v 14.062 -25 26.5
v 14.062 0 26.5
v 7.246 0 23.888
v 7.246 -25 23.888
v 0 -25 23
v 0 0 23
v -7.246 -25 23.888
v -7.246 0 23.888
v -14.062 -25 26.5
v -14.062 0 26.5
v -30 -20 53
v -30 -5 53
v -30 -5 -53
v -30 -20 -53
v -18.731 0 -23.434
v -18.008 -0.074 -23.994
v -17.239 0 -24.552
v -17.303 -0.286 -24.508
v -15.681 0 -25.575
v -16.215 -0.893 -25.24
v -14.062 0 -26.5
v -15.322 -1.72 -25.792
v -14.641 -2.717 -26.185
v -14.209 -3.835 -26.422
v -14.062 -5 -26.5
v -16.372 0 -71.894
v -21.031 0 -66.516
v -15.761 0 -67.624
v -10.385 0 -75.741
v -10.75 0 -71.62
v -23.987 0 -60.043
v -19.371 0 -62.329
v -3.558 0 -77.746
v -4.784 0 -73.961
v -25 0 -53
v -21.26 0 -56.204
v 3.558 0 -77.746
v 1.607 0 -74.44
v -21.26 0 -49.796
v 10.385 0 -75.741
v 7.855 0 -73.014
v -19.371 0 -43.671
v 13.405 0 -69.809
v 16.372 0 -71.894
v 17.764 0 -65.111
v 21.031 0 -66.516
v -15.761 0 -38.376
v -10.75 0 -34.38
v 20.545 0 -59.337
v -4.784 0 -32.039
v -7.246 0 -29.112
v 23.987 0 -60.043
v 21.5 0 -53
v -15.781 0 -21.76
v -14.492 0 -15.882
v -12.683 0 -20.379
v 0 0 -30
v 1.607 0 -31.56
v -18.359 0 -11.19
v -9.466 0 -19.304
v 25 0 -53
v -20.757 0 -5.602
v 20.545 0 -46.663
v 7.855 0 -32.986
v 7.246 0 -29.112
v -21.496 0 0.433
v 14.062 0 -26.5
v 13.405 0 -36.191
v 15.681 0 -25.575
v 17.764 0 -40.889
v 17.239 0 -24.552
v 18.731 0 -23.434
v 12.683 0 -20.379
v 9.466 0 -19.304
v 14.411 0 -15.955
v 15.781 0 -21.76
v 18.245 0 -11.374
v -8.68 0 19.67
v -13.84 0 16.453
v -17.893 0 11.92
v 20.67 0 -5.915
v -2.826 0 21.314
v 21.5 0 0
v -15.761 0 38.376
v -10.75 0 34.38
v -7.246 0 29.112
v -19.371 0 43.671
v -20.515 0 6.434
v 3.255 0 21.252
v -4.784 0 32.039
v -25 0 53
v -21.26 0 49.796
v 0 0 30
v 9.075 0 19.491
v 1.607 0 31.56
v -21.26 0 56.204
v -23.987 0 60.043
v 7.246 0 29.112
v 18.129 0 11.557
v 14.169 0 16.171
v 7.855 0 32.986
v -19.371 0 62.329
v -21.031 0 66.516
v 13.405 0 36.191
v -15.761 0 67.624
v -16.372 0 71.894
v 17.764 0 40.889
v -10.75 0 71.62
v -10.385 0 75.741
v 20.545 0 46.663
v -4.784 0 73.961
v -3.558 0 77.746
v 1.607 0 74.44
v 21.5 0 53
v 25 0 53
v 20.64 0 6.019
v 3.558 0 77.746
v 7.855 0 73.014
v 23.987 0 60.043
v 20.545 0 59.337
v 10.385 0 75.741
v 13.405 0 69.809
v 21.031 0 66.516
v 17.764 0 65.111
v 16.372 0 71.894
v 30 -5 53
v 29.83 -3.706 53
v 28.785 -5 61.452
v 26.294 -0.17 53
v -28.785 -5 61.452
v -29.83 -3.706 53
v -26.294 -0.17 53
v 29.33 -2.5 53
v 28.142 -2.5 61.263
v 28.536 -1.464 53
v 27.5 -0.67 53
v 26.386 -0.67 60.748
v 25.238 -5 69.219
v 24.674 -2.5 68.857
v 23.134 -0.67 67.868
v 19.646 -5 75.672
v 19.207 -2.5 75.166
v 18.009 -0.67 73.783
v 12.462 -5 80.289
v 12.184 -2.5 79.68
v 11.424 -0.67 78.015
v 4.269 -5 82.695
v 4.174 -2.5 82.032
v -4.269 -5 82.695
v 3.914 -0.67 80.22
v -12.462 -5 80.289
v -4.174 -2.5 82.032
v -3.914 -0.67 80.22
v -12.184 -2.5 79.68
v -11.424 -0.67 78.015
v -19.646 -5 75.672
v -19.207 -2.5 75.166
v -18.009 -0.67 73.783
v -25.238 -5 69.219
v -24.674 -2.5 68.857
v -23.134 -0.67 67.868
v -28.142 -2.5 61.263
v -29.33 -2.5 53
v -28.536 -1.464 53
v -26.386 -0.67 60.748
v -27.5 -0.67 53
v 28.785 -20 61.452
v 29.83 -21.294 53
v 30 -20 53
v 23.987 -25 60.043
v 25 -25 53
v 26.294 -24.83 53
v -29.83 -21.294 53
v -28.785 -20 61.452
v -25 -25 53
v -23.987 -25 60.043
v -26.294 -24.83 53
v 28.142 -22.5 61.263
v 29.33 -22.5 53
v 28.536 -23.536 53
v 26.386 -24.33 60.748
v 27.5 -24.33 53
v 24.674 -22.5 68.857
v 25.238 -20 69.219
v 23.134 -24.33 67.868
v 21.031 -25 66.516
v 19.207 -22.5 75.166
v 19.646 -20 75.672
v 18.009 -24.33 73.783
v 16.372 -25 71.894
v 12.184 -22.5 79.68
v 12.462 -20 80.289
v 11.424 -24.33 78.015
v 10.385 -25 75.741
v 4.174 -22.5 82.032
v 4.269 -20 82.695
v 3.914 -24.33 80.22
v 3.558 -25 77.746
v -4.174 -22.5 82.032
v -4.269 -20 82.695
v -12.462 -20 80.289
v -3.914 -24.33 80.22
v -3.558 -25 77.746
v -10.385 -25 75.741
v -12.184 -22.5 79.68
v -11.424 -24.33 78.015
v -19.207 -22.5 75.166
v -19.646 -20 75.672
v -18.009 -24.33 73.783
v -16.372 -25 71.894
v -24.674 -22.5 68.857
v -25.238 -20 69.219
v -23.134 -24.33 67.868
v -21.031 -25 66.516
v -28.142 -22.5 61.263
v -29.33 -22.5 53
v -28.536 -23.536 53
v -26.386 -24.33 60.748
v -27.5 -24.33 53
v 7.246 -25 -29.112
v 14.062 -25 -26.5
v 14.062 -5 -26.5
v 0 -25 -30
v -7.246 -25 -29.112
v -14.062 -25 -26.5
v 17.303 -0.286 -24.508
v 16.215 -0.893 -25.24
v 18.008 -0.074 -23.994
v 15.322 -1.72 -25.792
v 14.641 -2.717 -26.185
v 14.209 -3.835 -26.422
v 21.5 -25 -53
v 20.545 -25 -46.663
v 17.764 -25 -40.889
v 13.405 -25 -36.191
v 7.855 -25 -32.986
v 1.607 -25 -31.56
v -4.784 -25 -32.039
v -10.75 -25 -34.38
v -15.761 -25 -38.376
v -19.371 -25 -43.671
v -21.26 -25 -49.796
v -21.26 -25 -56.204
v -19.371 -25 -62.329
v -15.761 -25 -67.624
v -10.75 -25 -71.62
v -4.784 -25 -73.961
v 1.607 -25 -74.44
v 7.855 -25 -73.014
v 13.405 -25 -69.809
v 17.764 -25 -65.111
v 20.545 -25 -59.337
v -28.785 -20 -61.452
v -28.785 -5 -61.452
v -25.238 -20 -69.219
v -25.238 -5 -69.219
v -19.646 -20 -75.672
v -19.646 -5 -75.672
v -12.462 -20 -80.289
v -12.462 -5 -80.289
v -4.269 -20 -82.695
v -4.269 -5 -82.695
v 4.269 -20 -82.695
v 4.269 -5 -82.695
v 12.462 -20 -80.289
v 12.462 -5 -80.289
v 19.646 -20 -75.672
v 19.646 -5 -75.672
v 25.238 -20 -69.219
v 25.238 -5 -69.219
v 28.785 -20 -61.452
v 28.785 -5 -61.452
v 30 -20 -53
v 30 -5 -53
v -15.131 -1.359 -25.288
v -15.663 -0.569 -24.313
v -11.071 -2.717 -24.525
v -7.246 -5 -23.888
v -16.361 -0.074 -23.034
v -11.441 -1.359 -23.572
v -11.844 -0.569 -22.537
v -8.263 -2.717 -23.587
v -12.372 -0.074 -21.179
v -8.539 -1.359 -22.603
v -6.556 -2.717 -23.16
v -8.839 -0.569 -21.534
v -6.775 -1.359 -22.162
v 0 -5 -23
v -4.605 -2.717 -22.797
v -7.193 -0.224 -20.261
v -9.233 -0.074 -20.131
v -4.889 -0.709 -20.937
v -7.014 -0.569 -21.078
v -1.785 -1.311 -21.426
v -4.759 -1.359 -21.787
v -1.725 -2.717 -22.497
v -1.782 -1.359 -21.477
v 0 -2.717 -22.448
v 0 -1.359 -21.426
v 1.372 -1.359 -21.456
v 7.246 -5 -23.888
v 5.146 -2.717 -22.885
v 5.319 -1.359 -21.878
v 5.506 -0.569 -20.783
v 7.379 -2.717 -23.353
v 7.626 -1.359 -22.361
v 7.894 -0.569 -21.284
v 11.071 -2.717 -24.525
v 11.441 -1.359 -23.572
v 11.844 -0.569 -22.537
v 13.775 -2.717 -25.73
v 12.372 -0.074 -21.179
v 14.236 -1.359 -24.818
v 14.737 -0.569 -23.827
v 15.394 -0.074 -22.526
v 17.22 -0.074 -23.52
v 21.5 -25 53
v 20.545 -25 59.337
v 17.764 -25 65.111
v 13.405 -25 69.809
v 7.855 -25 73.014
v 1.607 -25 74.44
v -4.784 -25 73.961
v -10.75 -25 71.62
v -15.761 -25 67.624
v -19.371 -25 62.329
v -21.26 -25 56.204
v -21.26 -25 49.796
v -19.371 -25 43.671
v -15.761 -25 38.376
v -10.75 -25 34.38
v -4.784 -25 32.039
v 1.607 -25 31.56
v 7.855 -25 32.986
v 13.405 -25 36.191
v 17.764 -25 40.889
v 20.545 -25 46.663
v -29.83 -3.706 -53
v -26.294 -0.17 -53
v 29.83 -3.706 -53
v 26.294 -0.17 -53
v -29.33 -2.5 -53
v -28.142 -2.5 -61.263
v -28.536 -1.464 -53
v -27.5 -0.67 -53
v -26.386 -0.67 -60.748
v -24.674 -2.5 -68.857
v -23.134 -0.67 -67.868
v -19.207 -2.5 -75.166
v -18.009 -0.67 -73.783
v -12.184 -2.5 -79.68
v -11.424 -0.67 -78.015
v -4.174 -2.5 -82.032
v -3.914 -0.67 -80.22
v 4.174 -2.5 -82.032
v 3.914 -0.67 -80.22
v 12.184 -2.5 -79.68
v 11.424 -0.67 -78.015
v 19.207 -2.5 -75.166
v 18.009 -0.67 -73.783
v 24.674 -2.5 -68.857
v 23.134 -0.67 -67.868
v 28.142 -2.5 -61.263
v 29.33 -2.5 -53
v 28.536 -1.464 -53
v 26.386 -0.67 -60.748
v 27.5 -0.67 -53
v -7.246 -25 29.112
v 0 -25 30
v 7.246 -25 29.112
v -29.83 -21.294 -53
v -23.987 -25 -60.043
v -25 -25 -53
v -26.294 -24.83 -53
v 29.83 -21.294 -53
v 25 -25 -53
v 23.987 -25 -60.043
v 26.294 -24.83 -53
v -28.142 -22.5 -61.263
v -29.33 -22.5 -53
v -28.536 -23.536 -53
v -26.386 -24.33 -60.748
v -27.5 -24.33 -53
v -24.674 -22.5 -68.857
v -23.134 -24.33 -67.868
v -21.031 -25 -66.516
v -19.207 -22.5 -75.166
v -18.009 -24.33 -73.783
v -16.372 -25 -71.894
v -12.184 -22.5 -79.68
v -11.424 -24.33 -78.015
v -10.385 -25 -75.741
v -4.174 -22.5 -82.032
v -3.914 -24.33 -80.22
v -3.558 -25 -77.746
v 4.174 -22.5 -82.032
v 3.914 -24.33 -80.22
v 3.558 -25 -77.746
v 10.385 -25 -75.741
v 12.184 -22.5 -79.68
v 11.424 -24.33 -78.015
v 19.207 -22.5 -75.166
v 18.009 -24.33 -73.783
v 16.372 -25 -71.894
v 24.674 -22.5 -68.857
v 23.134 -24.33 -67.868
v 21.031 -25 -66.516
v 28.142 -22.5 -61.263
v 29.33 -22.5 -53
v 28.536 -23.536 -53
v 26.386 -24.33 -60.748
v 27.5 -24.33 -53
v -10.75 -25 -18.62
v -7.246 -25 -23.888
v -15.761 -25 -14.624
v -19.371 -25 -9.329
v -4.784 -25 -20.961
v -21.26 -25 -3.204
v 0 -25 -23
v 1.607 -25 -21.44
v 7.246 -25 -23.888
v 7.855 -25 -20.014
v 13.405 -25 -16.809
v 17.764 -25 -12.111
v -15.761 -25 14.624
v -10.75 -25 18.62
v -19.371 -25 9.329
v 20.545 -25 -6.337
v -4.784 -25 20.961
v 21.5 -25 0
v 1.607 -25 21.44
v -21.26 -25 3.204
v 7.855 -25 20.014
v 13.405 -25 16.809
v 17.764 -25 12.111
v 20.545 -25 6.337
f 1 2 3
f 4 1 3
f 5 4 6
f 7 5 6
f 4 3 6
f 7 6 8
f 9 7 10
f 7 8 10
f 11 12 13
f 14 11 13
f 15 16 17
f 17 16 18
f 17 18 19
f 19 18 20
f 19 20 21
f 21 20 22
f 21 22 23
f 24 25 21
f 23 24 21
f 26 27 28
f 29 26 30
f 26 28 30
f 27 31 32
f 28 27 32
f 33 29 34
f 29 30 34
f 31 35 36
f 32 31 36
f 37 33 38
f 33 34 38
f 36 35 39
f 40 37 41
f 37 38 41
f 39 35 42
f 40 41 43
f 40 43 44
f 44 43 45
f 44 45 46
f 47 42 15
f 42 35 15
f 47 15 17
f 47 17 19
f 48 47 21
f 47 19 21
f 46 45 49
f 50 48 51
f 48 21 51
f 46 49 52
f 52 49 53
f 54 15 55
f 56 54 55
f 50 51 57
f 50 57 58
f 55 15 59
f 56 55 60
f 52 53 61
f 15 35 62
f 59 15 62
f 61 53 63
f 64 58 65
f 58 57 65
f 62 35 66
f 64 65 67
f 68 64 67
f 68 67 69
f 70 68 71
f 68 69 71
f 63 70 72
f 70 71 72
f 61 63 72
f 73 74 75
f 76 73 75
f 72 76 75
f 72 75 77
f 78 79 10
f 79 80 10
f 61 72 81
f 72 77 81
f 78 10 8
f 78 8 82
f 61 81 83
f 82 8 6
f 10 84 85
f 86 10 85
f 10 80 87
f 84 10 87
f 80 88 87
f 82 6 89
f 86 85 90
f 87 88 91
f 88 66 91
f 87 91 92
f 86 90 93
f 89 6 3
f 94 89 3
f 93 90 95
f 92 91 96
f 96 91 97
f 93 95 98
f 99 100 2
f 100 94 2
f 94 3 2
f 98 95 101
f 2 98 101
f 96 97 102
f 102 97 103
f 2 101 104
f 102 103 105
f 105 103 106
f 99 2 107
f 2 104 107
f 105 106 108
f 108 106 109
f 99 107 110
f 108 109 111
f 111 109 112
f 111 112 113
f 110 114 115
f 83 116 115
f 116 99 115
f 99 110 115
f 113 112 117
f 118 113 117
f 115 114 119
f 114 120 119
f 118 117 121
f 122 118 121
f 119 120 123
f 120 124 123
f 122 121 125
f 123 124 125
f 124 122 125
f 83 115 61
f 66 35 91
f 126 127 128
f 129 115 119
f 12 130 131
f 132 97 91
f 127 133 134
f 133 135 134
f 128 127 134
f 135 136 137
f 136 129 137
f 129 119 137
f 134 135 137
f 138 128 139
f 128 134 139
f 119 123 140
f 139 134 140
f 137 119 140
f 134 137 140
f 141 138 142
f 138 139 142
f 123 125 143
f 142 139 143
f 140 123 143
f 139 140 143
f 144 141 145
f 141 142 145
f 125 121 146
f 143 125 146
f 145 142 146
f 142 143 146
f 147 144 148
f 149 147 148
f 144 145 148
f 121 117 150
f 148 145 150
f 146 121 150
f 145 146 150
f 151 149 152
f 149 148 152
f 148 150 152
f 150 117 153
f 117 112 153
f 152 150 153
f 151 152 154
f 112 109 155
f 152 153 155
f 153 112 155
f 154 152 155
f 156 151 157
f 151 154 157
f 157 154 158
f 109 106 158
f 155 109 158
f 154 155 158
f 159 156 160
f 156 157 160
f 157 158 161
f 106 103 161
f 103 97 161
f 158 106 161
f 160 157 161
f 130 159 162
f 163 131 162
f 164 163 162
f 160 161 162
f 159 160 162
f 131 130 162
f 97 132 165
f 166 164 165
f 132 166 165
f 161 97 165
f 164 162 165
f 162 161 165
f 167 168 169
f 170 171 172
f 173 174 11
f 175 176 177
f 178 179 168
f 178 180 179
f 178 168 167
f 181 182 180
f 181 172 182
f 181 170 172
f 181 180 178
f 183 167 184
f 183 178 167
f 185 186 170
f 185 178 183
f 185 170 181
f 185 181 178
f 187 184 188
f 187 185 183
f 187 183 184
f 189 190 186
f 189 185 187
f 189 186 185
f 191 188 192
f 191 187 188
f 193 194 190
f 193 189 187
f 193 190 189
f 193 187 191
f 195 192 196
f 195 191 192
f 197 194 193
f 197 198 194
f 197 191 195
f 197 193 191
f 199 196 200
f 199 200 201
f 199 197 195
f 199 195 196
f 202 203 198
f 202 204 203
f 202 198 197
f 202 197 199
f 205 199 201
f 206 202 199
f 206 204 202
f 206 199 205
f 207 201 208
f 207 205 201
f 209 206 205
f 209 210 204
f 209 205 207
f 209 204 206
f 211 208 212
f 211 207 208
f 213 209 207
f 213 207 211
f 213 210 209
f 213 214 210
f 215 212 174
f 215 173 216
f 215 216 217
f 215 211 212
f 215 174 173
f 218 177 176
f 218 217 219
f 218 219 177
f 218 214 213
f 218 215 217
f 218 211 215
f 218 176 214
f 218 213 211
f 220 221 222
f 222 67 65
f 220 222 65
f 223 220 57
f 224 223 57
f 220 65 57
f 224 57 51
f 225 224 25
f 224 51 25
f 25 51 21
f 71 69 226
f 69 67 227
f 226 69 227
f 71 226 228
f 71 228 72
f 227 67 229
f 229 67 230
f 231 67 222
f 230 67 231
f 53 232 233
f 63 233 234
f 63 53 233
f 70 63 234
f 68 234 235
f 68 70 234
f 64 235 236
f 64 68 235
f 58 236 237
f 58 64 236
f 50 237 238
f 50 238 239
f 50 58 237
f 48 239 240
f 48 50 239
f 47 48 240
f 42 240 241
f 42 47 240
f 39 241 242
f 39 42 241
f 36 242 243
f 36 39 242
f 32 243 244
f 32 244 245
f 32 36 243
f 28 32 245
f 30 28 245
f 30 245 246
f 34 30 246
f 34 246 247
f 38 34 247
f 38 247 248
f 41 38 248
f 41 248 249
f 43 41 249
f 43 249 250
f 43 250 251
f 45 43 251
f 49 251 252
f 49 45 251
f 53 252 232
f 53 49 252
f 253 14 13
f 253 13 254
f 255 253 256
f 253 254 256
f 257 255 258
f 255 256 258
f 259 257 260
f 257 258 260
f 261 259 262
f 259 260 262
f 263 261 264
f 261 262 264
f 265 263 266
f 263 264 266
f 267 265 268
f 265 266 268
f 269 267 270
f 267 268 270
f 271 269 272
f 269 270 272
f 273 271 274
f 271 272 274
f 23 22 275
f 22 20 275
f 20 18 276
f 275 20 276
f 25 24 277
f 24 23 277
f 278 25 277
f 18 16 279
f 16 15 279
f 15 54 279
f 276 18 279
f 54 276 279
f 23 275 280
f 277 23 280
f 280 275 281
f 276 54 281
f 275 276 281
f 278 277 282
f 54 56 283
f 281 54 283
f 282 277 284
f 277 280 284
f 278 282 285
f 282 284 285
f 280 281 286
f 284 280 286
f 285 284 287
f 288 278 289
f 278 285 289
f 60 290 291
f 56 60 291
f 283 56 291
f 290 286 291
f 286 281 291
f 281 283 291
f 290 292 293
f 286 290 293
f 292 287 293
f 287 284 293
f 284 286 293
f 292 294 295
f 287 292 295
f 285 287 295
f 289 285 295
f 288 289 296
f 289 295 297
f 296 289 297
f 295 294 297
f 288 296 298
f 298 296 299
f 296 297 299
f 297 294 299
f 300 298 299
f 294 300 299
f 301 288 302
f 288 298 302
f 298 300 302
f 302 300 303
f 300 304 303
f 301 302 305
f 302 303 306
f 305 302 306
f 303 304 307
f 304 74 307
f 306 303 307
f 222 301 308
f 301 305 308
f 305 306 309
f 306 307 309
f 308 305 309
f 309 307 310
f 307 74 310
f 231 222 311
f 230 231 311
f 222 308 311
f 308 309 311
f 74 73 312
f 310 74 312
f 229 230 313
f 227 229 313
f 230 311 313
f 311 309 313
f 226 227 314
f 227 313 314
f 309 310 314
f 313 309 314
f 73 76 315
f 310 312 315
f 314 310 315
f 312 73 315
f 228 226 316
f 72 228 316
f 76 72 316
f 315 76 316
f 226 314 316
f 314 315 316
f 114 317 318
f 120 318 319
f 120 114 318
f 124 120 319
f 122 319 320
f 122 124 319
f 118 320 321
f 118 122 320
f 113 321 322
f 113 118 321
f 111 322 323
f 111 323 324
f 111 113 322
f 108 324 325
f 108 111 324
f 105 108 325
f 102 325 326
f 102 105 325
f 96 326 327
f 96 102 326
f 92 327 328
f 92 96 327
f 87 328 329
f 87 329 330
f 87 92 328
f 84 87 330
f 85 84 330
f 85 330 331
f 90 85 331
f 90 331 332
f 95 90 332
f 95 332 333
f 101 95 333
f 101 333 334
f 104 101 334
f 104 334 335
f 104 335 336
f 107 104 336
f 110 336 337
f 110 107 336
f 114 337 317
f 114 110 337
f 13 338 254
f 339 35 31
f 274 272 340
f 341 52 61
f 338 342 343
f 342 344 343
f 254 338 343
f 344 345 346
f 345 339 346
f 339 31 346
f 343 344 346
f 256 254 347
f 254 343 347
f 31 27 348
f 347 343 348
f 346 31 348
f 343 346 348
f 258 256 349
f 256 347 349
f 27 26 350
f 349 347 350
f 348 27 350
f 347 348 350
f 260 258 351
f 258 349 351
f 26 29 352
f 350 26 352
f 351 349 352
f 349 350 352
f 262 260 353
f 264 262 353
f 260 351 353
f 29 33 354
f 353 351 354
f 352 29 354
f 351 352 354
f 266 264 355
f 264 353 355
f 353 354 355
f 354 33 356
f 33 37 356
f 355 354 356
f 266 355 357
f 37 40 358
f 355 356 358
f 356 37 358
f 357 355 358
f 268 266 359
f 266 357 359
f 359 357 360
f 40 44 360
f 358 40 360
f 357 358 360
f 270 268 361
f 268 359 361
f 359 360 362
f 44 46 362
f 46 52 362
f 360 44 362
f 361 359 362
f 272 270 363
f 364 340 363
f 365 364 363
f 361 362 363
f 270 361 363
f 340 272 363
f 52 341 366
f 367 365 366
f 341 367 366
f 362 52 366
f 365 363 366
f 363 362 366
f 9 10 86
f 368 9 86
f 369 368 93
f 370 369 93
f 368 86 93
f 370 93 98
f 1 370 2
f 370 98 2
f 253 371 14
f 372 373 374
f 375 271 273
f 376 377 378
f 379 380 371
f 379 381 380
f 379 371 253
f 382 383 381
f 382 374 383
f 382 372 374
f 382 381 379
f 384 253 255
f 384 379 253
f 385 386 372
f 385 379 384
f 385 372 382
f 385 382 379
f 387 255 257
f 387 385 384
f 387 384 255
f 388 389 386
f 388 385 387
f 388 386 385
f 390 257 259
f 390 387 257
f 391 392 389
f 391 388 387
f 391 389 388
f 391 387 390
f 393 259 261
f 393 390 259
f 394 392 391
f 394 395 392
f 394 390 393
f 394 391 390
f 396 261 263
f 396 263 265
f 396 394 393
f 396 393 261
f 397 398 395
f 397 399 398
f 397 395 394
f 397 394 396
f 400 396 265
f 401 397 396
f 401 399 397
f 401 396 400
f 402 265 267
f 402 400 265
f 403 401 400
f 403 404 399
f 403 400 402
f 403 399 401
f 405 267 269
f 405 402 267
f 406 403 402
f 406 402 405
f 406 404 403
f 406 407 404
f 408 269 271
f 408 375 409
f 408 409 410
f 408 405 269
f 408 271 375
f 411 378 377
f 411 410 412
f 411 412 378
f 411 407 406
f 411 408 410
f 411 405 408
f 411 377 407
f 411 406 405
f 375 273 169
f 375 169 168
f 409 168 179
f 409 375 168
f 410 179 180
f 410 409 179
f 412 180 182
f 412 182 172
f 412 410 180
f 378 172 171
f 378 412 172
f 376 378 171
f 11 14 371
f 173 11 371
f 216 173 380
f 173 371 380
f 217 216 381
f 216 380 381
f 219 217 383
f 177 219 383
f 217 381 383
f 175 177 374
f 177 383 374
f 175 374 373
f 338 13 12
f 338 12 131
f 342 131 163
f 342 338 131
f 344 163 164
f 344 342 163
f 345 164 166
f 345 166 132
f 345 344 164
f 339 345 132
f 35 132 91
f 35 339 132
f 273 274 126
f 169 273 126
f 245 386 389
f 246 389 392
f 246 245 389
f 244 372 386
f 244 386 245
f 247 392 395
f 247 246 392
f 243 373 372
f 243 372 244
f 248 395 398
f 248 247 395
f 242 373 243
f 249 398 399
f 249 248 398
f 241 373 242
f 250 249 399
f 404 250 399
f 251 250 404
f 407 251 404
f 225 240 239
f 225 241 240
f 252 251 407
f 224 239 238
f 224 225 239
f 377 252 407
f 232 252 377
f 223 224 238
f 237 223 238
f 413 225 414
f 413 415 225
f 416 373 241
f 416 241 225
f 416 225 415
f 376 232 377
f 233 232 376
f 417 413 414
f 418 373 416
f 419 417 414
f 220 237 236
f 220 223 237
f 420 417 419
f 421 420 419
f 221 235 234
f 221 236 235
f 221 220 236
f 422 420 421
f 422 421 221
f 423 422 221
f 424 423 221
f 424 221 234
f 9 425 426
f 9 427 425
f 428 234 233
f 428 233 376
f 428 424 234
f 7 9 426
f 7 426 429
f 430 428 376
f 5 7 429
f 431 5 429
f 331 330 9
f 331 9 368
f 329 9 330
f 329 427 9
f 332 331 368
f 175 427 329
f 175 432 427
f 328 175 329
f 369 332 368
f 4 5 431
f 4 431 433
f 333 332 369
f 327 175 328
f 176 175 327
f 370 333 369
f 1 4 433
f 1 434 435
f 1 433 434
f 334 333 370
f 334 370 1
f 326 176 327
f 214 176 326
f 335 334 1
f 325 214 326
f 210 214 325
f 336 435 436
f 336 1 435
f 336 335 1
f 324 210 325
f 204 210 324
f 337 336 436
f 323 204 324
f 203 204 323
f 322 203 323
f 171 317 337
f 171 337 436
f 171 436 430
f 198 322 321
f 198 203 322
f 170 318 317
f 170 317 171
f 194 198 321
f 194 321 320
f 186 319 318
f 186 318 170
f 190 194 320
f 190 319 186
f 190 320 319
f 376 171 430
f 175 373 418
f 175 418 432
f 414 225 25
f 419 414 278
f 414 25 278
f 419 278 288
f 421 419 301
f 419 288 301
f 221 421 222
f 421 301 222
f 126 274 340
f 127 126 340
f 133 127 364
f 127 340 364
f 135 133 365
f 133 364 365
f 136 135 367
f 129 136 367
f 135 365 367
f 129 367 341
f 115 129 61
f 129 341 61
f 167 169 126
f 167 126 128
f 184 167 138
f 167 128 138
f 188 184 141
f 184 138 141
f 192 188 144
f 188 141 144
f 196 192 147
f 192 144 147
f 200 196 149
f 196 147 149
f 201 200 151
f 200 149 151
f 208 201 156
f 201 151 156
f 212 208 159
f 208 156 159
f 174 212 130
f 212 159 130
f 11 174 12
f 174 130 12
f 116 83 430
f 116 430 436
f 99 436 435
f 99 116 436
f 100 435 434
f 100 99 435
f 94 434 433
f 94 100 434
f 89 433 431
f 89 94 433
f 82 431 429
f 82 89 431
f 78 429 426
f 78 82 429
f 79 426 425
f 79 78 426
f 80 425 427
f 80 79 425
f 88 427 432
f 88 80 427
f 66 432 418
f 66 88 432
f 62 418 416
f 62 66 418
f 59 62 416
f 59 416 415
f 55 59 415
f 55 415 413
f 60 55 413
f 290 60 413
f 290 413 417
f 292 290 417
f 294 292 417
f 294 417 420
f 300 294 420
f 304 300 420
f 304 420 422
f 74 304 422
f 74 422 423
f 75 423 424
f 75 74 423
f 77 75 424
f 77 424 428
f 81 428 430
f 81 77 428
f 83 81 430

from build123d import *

# Parameters (mm, degrees)
F0_R         = 21.5
F1_DEPTH     = 25
F2_T1_DEPTH  = 106
F2_T4_ANGLE  = 180
F2_T8_ANGLE  = 103.6596556564
F2_S9_R      = 30
F2_T10_DEPTH = 37
F2_T12_ANGLE = 180
F2_T14_ANGLE = 180
F2_T16_ANGLE = 180


# Not quite as in the source:
# - a fillet or chamfer that OpenCascade refuses, or shapes differently, is made with other operations: its cross-section is extruded or revolved along the edge and cut away or added


with BuildPart() as f1:
    # F0 (on Front) → F1 (new body)
    with BuildSketch(Plane.XZ):
        with BuildLine():
            ThreePointArc((14.0623611104, -26.5), (25.7086642332, -15.4617134673), (30, 0))
            ThreePointArc((30, 0), (25.7086642332, 15.4617134673), (14.0623611104, 26.5))
            ThreePointArc((14.0623611104, 26.5), (0, 23), (-14.0623611104, 26.5))
            ThreePointArc((-14.0623611104, 26.5), (-25.7086642332, 15.4617134673), (-30, 0))
            ThreePointArc((-30, 0), (-25.7086642332, -15.4617134673), (-14.0623611104, -26.5))
            ThreePointArc((-14.0623611104, -26.5), (0, -23), (14.0623611104, -26.5))
        make_face()
        Circle(F0_R, mode=Mode.SUBTRACT)
        with BuildLine():
            Line((30, -53), (30, 0))
            ThreePointArc((30, 0), (25.7086642332, -15.4617134673), (14.0623611104, -26.5))
            ThreePointArc((14.0623611104, -26.5), (25.7086642332, -37.5382865327), (30, -53))
        make_face()
        with BuildLine():
            ThreePointArc((14.0623611104, 26.5), (25.7086642332, 15.4617134673), (30, 0))
            Line((30, 0), (30, 53))
            ThreePointArc((30, 53), (25.7086642332, 37.5382865327), (14.0623611104, 26.5))
        make_face()
        with BuildLine():
            ThreePointArc((-14.0623611104, 26.5), (0, 30), (14.0623611104, 26.5))
            ThreePointArc((14.0623611104, 26.5), (25.7086642332, 37.5382865327), (30, 53))
            ThreePointArc((30, 53), (0, 83), (-30, 53))
            ThreePointArc((-30, 53), (-25.7086642332, 37.5382865327), (-14.0623611104, 26.5))
        make_face()
        with Locations((0, 53)):
            Circle(F0_R, mode=Mode.SUBTRACT)
        with BuildLine():
            ThreePointArc((30, -53), (25.7086642332, -37.5382865327), (14.0623611104, -26.5))
            ThreePointArc((14.0623611104, -26.5), (0, -30), (-14.0623611104, -26.5))
            ThreePointArc((-14.0623611104, -26.5), (-25.7086642332, -37.5382865327), (-30, -53))
            ThreePointArc((-30, -53), (0, -83), (30, -53))
        make_face()
        with Locations((0, -53)):
            Circle(F0_R, mode=Mode.SUBTRACT)
        with BuildLine():
            ThreePointArc((-30, 0), (-25.7086642332, 15.4617134673), (-14.0623611104, 26.5))
            ThreePointArc((-14.0623611104, 26.5), (-25.7086642332, 37.5382865327), (-30, 53))
            Line((-30, 53), (-30, 0))
        make_face()
        with BuildLine():
            ThreePointArc((-30, -53), (-25.7086642332, -37.5382865327), (-14.0623611104, -26.5))
            ThreePointArc((-14.0623611104, -26.5), (-25.7086642332, -15.4617134673), (-30, 0))
            Line((-30, 0), (-30, -53))
        make_face()
    extrude(amount=F1_DEPTH)

    # F2: fillet of radius 5 on 3 edges, made by hand

    # F2_s2 → F2_t1 (cut)
    with BuildSketch(Plane.XY.offset(-53)):
        with BuildLine():
            ThreePointArc((-30, -20), (-28.5355339059, -23.5355339059), (-25, -25))
            Line((-25, -25), (-25, -25.1))
            Line((-25, -25.1), (-30.1, -25.1))
            Line((-30.1, -25.1), (-30.1, -20))
            Line((-30.1, -20), (-30, -20))
        make_face()
        with BuildLine():
            ThreePointArc((-30, -5), (-28.5355339059, -1.4644660941), (-25, 0))
            Line((-25, 0), (-25, 0.1))
            Line((-25, 0.1), (-30.1, 0.1))
            Line((-30.1, 0.1), (-30.1, -5))
            Line((-30.1, -5), (-30, -5))
        make_face()
        with BuildLine():
            ThreePointArc((30, -5), (28.5355339059, -1.4644660941), (25, 0))
            Line((25, 0), (25, 0.1))
            Line((25, 0.1), (30.1, 0.1))
            Line((30.1, 0.1), (30.1, -5))
            Line((30.1, -5), (30, -5))
        make_face()
        with BuildLine():
            ThreePointArc((30, -20), (28.5355339059, -23.5355339059), (25, -25))
            Line((25, -25), (25, -25.1))
            Line((25, -25.1), (30.1, -25.1))
            Line((30.1, -25.1), (30.1, -20))
            Line((30.1, -20), (30, -20))
        make_face()
    extrude(amount=F2_T1_DEPTH, mode=Mode.SUBTRACT)

    # F2_s3 → F2_t4 (revolve, cut)
    with BuildSketch(Plane.XY.offset(-53)):
        with BuildLine():
            ThreePointArc((-30, -5), (-28.5355339059, -1.4644660941), (-25, 0))
            Line((-25, 0), (-25, 0.1))
            Line((-25, 0.1), (-30.1, 0.1))
            Line((-30.1, 0.1), (-30.1, -5))
            Line((-30.1, -5), (-30, -5))
        make_face()
    revolve(axis=Axis((0, 0, -53), (0, -1, 0)), revolution_arc=F2_T4_ANGLE, mode=Mode.SUBTRACT)


with BuildPart() as f2_tool6:
    # F2_s7 → F2_t8 (revolve)
    with BuildSketch(Plane(origin=(-25.7504646383, 0, -32.7580804495), x_dir=(0, 1, 0), z_dir=(-0.6179991993, 0, -0.7861787263))):
        with BuildLine():
            ThreePointArc((-5, 2.7539575651), (-1.4644660941, 1.289491471), (0, -2.2460424349))
            Line((0, -2.2460424349), (0.1, -2.2460424349))
            Line((0.1, -2.2460424349), (0.1, 2.8539575651))
            Line((0.1, 2.8539575651), (-5, 2.8539575651))
            Line((-5, 2.8539575651), (-5, 2.7539575651))
        make_face()
    revolve(axis=Axis((0, 0, -53), (0, 1, 0)), revolution_arc=F2_T8_ANGLE)

    # F2_s9 → F2_t10 (intersect, symmetric)
    with BuildSketch(Plane.XZ.offset(4.2)):
        Circle(F2_S9_R)
    extrude(amount=F2_T10_DEPTH, both=True, mode=Mode.INTERSECT)


with BuildPart() as f1_1:
    add(f1.part)

    # F2_t5: cut F2_tool6
    add(f2_tool6.part, mode=Mode.SUBTRACT)

    # F2_s11 → F2_t12 (revolve, cut)
    with BuildSketch(Plane.XY.offset(53)):
        with BuildLine():
            ThreePointArc((30, -5), (28.5355339059, -1.4644660941), (25, 0))
            Line((25, 0), (25, 0.1))
            Line((25, 0.1), (30.1, 0.1))
            Line((30.1, 0.1), (30.1, -5))
            Line((30.1, -5), (30, -5))
        make_face()
    revolve(axis=Axis((0, 0, 53), (0, -1, 0)), revolution_arc=F2_T12_ANGLE, mode=Mode.SUBTRACT)

    # F2_s13 → F2_t14 (revolve, cut)
    with BuildSketch(Plane.XY.offset(53)):
        with BuildLine():
            ThreePointArc((30, -20), (28.5355339059, -23.5355339059), (25, -25))
            Line((25, -25), (25, -25.1))
            Line((25, -25.1), (30.1, -25.1))
            Line((30.1, -25.1), (30.1, -20))
            Line((30.1, -20), (30, -20))
        make_face()
    revolve(axis=Axis((0, -25, 53), (0, -1, 0)), revolution_arc=F2_T14_ANGLE, mode=Mode.SUBTRACT)

    # F2_s15 → F2_t16 (revolve, cut)
    with BuildSketch(Plane.XY.offset(-53)):
        with BuildLine():
            ThreePointArc((-30, -20), (-28.5355339059, -23.5355339059), (-25, -25))
            Line((-25, -25), (-25, -25.1))
            Line((-25, -25.1), (-30.1, -25.1))
            Line((-30.1, -25.1), (-30.1, -20))
            Line((-30.1, -20), (-30, -20))
        make_face()
    revolve(axis=Axis((0, -25, -53), (0, -1, 0)), revolution_arc=F2_T16_ANGLE, mode=Mode.SUBTRACT)


solid = f1_1.part
